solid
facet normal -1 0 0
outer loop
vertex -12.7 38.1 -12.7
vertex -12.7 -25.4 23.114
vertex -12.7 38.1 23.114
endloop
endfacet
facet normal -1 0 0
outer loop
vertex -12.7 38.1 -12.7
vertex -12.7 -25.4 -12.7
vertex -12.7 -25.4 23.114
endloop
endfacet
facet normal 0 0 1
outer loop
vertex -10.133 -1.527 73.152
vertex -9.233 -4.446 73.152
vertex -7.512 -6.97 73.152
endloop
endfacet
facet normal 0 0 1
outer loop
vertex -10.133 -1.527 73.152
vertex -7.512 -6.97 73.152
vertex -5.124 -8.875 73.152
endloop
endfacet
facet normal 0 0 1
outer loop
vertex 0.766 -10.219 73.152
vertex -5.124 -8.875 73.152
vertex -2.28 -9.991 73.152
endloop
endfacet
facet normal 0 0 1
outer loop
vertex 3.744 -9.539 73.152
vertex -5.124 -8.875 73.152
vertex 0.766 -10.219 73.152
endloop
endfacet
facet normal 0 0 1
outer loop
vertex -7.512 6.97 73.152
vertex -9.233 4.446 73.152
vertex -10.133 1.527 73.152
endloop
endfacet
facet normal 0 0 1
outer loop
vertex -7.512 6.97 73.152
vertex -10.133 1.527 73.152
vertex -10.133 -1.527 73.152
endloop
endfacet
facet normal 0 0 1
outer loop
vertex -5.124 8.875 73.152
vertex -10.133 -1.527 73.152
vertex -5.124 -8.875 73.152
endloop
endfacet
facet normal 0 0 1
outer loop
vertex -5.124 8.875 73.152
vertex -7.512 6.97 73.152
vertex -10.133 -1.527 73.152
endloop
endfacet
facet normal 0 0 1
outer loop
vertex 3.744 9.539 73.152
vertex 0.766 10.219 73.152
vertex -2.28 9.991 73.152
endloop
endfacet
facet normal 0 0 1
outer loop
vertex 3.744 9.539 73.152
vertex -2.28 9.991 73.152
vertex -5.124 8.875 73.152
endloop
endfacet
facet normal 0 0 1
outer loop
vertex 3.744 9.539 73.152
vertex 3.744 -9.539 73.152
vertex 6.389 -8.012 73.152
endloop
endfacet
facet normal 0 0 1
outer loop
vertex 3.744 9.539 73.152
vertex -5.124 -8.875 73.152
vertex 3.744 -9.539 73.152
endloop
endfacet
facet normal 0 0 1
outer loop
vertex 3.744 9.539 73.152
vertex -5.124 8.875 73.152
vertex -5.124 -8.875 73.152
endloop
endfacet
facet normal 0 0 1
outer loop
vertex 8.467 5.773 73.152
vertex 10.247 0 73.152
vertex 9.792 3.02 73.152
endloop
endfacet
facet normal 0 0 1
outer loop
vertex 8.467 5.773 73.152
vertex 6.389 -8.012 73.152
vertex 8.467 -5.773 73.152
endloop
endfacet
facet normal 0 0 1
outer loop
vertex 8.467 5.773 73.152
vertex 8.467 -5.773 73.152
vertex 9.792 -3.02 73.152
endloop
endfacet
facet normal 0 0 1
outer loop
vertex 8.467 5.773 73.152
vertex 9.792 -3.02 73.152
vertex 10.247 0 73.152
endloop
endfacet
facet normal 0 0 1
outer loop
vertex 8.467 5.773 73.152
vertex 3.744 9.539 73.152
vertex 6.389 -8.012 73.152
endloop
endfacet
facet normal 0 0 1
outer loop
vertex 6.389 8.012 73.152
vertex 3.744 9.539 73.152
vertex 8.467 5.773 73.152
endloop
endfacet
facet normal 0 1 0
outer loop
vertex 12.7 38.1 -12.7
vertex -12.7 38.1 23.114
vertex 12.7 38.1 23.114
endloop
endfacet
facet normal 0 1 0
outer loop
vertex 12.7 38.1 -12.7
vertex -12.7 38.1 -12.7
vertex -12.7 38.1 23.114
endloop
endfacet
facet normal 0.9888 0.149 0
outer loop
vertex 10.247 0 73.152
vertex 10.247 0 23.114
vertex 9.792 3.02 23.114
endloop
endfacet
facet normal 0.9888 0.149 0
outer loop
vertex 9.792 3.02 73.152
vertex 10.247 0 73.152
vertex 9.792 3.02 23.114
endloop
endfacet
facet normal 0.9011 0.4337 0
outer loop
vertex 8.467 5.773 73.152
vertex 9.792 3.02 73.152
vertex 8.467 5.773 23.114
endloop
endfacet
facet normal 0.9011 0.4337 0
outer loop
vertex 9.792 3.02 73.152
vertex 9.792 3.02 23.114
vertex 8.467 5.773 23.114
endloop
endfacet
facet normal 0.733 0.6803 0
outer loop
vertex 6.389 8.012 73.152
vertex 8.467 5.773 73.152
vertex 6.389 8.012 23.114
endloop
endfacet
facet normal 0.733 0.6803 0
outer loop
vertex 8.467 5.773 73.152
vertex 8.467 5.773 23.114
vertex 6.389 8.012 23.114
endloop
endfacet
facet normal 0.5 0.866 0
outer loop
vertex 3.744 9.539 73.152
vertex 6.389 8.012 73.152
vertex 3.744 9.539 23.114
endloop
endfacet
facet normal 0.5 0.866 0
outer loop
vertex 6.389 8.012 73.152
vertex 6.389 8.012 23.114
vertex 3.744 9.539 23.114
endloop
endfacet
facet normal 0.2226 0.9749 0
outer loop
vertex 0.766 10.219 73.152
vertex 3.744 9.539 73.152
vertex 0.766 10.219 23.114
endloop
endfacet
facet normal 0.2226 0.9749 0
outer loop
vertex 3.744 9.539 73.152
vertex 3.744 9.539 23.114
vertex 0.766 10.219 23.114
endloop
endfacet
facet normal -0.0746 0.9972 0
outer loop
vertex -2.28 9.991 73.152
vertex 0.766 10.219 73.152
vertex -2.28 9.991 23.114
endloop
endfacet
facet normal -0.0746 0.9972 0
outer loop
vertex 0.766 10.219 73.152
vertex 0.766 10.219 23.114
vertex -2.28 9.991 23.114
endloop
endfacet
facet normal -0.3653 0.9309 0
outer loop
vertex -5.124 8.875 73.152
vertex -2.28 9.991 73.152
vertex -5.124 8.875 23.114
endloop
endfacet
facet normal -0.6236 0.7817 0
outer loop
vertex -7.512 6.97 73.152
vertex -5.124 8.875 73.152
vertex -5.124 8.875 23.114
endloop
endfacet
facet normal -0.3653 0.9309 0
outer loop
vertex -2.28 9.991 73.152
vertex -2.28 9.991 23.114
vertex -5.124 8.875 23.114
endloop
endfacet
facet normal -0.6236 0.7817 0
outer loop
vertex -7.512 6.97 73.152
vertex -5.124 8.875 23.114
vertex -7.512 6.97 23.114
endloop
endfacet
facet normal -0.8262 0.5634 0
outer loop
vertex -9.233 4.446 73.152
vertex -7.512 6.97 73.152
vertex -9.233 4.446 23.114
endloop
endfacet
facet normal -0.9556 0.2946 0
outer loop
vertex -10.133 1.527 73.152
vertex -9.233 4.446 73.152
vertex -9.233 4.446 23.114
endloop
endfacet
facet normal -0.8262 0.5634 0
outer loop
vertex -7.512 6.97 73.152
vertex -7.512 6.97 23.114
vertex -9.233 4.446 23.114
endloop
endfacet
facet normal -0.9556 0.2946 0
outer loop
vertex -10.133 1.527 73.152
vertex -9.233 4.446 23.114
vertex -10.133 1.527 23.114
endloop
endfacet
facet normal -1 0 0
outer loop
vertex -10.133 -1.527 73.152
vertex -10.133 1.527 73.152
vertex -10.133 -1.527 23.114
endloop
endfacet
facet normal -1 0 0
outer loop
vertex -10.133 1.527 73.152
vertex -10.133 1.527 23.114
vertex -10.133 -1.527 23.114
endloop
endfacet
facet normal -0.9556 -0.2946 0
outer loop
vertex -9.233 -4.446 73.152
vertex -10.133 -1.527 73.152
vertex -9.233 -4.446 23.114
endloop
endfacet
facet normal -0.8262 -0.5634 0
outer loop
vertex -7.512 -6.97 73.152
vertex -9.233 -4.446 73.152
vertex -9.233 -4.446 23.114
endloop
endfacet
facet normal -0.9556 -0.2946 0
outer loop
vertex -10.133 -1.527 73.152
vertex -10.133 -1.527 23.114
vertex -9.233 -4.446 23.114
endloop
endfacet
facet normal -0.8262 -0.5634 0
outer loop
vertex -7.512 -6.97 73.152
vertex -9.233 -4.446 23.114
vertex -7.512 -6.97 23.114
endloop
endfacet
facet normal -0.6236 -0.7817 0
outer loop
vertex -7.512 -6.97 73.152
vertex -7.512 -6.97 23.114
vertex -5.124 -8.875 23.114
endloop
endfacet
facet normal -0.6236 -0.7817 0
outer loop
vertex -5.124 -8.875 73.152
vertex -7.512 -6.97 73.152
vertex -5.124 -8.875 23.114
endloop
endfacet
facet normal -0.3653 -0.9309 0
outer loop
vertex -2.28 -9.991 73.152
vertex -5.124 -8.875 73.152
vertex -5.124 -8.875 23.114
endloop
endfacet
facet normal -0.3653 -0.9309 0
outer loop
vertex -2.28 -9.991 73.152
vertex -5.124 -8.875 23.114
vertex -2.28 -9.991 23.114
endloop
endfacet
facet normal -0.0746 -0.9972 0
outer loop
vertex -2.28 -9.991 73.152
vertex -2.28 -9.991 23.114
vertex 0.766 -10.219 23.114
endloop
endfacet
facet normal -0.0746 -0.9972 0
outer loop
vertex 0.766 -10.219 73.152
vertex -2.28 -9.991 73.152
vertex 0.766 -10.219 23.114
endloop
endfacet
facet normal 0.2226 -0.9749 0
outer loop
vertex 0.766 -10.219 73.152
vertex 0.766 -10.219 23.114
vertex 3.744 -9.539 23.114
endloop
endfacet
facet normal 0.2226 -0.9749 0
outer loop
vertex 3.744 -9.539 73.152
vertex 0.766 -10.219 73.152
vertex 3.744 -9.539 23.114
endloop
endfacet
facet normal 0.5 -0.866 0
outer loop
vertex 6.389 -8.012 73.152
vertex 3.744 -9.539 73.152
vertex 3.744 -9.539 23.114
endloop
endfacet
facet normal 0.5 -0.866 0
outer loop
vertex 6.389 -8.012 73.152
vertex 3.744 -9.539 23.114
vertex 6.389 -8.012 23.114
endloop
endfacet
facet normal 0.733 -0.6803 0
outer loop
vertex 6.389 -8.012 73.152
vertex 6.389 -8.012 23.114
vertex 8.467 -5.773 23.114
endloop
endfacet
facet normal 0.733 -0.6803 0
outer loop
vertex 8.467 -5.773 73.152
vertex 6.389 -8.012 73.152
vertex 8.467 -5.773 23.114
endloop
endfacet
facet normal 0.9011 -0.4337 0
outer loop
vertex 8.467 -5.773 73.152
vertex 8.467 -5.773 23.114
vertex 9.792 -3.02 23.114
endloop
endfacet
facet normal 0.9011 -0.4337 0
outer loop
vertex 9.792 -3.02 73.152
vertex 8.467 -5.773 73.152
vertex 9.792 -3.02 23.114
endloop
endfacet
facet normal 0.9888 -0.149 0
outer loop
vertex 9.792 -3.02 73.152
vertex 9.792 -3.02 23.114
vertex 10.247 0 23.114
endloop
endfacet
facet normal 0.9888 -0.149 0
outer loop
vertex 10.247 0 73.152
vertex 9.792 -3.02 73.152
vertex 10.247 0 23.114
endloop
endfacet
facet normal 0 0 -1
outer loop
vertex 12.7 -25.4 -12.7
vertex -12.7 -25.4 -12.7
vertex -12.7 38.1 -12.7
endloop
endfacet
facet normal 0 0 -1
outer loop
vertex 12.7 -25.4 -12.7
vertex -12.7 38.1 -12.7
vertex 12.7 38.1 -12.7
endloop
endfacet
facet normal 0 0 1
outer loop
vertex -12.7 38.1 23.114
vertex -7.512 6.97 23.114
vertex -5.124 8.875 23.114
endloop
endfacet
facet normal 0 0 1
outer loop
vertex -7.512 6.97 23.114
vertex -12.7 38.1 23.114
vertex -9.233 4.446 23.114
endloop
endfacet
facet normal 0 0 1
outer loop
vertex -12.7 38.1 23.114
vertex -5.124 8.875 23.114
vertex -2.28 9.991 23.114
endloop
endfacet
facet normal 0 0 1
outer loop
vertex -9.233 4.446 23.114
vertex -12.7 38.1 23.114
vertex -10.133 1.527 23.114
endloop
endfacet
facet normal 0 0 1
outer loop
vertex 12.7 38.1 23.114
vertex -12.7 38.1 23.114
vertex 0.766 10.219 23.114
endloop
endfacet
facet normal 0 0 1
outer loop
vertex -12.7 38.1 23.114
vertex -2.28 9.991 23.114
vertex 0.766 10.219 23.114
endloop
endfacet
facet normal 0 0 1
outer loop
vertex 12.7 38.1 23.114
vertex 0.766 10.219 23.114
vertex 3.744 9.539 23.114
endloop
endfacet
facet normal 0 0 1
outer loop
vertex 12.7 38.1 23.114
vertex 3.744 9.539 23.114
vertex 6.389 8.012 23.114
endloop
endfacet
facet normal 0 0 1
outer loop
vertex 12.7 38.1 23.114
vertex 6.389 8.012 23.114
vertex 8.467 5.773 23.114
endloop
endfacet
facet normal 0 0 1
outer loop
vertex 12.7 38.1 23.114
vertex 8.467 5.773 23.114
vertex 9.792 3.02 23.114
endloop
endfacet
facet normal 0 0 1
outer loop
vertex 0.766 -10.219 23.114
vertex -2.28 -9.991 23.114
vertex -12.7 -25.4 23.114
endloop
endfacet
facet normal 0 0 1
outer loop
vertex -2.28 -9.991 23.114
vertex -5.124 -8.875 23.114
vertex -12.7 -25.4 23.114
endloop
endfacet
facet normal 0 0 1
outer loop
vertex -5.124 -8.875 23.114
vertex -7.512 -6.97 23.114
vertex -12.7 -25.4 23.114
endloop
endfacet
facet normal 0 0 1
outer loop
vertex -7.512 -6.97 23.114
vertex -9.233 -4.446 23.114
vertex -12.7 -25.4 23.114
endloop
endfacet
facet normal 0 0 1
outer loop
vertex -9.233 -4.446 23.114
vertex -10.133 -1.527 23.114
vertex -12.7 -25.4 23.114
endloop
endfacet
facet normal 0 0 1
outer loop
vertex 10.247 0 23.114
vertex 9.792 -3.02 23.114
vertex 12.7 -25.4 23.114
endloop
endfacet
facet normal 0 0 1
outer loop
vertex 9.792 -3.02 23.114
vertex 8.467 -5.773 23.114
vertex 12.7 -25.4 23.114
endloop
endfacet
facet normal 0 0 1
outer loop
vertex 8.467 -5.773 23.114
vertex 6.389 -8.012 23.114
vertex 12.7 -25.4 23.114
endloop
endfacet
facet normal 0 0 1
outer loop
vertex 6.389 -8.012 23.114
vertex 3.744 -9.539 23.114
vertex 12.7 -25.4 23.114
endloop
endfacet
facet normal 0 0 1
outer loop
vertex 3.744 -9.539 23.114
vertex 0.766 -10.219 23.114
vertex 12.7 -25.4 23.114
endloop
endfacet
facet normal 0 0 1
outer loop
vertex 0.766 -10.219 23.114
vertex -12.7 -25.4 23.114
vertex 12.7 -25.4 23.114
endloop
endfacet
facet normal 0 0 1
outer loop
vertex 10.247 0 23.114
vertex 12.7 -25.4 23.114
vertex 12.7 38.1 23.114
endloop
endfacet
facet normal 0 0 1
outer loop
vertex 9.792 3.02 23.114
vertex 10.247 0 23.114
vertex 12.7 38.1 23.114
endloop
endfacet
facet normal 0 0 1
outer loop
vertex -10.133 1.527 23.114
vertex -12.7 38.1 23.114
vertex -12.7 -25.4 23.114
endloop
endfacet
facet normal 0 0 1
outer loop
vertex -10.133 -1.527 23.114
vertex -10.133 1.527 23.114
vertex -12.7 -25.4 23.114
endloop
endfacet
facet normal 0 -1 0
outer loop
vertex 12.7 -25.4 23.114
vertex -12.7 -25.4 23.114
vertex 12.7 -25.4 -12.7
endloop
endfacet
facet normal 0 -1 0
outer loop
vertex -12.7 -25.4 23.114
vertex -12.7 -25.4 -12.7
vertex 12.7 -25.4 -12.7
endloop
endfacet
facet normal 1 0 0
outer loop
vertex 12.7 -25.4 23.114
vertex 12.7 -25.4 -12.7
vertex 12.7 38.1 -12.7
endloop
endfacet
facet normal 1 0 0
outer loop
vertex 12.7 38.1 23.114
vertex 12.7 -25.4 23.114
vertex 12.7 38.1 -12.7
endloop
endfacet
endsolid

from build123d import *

# Parameters (mm, degrees)
F0_W     = 25.4
F0_H     = 25.4
F1_DEPTH = 25.4
F2_DEPTH = 38.1
F3_DEPTH = 10.414
F4_R     = 10.2474826173
F5_DEPTH = 73.152


# Not quite as in the source:
# - the program builds the solid bodies; features that only make, move or delete a surface that nothing else refers to are left out


with BuildPart() as f1:
    # F0 (on Front) → F1 (new body)
    with BuildSketch(Plane.XZ):
        Rectangle(F0_W, F0_H)
    extrude(amount=F1_DEPTH)

    # F2 (add): a face of the model
    f2_faces = [f1.faces().sort_by_distance(p)[0] for p in [
        (0, 0, 0),
    ]]
    extrude(f2_faces, amount=F2_DEPTH)

    # F3 (add): a face of the model
    f3_faces = [f1.faces().sort_by_distance(p)[0] for p in [
        (0, 6.35, 12.7),
    ]]
    extrude(f3_faces, amount=F3_DEPTH)

    # F4 (on Top) → F5 (join)
    with BuildSketch(Plane.XY):
        Circle(F4_R)
    extrude(amount=F5_DEPTH)


solid = f1.part
